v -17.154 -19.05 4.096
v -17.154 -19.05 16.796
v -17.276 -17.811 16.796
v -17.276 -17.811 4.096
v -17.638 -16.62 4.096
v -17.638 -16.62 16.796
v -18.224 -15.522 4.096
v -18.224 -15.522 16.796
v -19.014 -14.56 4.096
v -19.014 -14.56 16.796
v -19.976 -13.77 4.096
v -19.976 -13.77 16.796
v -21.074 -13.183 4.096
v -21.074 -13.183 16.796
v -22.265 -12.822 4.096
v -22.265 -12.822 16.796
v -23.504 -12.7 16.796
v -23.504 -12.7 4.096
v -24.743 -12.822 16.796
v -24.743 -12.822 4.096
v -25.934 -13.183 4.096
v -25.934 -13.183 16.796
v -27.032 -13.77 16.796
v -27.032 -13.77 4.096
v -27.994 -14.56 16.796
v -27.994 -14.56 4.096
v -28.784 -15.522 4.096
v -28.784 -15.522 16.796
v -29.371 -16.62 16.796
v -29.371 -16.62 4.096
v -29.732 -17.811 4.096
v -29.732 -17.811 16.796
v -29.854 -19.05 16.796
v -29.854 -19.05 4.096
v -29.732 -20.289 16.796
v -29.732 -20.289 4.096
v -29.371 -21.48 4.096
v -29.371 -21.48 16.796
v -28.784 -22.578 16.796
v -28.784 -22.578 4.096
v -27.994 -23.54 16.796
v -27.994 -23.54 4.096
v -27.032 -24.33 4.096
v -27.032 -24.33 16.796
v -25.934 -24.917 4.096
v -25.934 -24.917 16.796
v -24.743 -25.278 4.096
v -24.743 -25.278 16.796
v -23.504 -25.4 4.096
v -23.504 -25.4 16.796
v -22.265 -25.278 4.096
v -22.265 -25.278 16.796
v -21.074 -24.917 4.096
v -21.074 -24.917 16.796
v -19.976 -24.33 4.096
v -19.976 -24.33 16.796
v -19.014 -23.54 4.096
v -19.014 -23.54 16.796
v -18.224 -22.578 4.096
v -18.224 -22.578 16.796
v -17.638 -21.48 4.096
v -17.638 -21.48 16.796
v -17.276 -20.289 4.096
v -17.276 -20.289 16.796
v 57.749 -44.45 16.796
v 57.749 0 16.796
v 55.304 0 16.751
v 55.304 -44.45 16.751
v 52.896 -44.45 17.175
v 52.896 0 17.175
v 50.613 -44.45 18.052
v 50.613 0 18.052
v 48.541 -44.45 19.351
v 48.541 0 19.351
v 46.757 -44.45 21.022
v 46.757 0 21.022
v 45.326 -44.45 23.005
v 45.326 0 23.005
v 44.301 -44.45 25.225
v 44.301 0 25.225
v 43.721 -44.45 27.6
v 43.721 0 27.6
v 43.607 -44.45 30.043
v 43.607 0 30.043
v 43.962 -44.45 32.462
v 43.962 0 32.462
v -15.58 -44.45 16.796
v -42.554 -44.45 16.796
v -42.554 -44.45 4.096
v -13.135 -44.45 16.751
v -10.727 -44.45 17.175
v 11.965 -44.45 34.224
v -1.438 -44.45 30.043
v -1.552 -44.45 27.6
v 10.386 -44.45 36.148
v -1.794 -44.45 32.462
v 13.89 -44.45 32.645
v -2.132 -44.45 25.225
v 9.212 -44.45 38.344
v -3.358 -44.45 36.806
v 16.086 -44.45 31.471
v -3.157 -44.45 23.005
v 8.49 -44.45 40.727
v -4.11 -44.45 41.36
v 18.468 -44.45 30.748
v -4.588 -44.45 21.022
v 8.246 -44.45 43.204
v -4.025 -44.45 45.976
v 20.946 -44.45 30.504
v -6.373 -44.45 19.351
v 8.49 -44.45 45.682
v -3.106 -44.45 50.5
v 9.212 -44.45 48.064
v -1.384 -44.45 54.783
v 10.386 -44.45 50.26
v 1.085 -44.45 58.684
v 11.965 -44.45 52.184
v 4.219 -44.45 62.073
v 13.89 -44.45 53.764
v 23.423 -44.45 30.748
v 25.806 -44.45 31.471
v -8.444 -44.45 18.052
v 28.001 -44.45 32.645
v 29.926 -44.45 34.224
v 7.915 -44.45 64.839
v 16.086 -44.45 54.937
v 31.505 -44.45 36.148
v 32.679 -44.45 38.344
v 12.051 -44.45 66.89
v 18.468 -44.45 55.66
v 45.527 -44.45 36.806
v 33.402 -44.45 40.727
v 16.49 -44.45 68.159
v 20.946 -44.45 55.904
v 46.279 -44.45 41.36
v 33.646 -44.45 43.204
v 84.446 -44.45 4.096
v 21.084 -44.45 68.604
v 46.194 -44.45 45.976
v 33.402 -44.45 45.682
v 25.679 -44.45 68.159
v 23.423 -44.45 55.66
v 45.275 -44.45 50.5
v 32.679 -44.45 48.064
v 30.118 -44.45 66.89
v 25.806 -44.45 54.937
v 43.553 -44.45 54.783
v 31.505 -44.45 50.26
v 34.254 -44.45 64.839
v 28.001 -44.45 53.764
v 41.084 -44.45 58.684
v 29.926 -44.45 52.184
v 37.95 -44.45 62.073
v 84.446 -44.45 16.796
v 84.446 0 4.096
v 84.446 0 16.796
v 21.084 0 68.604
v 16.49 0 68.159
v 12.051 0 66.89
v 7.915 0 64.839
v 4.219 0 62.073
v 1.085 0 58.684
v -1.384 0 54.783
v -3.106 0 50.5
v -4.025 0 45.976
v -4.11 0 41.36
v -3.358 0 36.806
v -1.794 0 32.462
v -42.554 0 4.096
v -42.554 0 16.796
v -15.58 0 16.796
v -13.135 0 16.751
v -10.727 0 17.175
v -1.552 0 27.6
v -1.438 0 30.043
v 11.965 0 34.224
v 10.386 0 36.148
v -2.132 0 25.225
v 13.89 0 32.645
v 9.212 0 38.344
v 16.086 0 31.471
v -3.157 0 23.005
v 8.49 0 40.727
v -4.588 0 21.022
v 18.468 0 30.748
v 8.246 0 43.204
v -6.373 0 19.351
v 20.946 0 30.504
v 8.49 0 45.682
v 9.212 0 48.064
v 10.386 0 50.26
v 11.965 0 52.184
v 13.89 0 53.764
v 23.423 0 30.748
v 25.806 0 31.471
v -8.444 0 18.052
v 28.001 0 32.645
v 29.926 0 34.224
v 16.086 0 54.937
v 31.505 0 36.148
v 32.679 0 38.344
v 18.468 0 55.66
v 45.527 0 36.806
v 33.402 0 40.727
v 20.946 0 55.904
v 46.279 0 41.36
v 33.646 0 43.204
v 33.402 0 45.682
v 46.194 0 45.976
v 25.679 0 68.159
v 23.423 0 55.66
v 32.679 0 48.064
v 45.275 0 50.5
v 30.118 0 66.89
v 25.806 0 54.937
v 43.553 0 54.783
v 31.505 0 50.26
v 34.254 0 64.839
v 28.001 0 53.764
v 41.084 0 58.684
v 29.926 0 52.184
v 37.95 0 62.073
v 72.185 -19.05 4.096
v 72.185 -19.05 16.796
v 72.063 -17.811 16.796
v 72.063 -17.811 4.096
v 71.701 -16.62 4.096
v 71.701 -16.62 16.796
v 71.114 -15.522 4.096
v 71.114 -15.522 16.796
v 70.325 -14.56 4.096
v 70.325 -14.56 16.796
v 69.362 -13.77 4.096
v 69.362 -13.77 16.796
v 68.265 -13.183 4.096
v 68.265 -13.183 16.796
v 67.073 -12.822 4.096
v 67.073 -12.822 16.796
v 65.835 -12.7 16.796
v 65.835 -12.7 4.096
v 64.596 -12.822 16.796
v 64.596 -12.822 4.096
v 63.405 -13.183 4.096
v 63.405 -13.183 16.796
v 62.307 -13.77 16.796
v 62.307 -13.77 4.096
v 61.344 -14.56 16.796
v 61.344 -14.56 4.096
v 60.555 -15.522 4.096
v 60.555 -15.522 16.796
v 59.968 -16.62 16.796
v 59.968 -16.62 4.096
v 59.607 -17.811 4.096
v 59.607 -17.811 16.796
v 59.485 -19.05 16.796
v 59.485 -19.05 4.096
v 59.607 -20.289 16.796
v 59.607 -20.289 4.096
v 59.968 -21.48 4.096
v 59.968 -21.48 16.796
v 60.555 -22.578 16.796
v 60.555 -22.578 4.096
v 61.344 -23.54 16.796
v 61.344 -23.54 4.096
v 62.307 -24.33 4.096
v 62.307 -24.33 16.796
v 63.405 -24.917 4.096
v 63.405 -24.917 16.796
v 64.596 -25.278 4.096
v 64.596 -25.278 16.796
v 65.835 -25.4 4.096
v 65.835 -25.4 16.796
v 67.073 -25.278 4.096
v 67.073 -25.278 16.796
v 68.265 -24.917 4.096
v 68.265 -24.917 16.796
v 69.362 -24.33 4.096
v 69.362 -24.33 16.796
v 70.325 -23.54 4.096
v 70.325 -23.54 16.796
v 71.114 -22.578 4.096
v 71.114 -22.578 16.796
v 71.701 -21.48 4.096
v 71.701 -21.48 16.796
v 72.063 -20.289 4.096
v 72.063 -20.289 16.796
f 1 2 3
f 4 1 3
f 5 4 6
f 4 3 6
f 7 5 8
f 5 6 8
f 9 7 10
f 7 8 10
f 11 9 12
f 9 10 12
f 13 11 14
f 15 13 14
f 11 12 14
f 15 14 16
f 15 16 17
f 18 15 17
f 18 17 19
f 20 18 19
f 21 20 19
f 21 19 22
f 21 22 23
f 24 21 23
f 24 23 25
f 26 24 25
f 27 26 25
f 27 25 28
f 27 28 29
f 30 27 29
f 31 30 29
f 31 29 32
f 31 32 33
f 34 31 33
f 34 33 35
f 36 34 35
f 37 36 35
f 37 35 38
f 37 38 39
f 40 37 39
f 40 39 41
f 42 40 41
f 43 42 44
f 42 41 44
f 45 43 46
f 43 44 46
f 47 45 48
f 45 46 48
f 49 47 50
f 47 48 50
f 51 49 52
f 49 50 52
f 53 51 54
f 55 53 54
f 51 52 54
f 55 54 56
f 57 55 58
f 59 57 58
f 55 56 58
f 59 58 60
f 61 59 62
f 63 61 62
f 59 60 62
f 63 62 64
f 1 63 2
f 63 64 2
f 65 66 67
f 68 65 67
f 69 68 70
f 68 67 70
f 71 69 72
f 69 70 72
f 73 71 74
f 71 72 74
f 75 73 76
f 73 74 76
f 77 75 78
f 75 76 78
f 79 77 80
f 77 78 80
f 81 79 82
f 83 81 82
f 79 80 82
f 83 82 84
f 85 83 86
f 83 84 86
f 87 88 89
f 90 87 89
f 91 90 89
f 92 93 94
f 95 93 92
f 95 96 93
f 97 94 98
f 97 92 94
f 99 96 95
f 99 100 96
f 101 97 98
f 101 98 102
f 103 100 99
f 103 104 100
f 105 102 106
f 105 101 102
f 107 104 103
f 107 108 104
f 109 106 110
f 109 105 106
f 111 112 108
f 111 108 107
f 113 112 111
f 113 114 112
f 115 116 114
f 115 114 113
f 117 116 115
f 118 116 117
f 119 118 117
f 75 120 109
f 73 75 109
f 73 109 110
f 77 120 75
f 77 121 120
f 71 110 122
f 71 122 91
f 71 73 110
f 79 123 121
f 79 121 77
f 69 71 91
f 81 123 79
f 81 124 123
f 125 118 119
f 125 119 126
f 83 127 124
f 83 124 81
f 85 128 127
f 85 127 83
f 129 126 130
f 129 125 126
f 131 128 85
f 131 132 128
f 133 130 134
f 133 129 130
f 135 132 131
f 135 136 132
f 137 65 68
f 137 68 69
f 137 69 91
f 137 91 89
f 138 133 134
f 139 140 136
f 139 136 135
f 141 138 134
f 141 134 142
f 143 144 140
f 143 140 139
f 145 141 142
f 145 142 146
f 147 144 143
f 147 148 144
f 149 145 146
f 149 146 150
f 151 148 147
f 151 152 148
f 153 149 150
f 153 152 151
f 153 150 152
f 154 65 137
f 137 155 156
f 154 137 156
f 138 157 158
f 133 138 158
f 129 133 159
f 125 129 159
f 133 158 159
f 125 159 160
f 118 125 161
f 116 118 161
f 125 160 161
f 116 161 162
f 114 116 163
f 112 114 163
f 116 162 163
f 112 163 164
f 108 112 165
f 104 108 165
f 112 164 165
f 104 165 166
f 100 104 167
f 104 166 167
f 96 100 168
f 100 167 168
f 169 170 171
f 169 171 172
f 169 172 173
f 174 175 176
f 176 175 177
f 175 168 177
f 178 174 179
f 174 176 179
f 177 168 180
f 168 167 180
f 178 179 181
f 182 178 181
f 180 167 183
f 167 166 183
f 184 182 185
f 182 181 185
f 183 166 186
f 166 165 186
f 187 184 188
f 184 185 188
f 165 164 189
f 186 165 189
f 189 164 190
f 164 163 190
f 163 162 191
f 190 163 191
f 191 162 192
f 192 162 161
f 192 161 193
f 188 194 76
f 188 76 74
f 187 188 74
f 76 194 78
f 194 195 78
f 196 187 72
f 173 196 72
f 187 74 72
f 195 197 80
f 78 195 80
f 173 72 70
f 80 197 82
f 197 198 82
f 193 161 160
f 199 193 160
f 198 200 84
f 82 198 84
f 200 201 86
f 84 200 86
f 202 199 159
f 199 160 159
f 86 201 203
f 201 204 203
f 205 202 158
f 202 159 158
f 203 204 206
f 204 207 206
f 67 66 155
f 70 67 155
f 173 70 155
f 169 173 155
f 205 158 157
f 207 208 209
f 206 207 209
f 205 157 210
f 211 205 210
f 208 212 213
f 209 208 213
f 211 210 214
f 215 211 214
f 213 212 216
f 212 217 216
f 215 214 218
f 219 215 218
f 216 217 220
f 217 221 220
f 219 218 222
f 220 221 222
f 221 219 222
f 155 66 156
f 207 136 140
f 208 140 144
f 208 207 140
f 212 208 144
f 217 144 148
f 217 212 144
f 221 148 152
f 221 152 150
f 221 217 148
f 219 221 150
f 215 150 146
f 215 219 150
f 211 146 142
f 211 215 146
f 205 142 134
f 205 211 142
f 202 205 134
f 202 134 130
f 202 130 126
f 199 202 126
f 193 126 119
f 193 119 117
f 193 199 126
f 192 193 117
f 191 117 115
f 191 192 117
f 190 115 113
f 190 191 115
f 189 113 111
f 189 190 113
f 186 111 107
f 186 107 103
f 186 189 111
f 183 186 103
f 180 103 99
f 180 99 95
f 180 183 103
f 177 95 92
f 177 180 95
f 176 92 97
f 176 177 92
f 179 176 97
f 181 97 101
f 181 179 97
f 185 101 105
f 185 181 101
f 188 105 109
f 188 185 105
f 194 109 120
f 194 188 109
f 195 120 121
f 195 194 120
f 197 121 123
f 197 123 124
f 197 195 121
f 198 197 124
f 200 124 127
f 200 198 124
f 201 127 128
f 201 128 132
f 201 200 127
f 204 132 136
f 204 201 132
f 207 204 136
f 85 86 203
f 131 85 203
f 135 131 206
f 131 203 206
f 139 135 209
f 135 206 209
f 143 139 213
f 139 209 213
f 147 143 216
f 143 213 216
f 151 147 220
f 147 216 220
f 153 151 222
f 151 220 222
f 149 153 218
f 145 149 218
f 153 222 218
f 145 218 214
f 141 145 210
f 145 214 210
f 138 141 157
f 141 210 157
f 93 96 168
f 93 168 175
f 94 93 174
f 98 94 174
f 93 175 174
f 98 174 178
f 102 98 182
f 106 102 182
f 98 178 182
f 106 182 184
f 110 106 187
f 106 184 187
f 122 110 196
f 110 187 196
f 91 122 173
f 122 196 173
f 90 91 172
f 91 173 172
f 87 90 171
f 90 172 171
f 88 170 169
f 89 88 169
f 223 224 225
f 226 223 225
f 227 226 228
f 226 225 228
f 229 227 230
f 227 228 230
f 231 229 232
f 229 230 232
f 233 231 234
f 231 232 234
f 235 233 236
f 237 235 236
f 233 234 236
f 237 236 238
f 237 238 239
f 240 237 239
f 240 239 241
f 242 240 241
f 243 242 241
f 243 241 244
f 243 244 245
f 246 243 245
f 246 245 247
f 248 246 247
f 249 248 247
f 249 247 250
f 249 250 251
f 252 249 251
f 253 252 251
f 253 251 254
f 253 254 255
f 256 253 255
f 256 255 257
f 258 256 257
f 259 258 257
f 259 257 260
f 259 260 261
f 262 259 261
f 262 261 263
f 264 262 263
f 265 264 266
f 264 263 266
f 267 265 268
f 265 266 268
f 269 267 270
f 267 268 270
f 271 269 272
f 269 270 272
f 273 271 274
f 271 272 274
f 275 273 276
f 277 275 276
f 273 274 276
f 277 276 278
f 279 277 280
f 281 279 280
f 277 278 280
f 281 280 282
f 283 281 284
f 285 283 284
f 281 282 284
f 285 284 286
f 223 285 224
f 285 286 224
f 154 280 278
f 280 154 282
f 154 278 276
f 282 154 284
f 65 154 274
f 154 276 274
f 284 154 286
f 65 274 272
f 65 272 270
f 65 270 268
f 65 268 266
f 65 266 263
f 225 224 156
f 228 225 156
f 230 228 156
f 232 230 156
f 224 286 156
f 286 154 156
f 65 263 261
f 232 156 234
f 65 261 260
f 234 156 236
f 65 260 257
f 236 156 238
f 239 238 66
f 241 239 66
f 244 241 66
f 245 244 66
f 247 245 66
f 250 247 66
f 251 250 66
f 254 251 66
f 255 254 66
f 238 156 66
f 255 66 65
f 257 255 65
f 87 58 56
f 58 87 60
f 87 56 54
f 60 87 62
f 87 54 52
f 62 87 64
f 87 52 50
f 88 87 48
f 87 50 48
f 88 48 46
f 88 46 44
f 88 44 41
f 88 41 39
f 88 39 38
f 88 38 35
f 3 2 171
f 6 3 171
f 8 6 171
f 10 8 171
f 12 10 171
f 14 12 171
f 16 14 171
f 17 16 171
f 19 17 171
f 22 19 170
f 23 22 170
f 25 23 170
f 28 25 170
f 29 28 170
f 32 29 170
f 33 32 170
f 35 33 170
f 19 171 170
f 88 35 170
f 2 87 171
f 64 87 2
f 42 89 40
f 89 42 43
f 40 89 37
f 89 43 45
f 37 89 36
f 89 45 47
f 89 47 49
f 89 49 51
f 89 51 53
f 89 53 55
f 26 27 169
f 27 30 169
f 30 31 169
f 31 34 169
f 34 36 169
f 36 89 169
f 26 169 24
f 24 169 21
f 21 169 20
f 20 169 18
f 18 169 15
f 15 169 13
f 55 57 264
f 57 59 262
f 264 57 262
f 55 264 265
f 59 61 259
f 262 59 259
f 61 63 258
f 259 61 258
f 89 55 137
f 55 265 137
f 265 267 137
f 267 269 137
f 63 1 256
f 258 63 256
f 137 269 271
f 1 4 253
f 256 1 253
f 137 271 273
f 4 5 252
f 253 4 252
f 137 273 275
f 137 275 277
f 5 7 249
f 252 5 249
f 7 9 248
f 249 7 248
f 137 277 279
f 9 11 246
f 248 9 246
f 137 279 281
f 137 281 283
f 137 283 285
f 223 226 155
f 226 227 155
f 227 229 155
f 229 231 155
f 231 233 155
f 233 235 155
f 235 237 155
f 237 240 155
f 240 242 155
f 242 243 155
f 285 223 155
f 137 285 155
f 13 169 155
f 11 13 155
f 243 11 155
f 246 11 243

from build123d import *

# Parameters (mm, degrees)
F0_R     = 12.7
F1_DEPTH = 44.45
F2_R     = 6.35
F3_DEPTH = 12.701


with BuildPart() as f1:
    # F0 (on Front) → F1 (new body)
    with BuildSketch(Plane.XZ):
        with BuildLine():
            ThreePointArc((57.748717, 16.796402), (46.756889, 21.022344), (43.962452, 32.462187))
            ThreePointArc((43.962452, 32.462187), (42.407297, 56.789571), (21.084465, 68.603839))
            ThreePointArc((21.084465, 68.603839), (-0.238367, 56.789571), (-1.793522, 32.462187))
            ThreePointArc((-1.793522, 32.462187), (-4.587959, 21.022344), (-15.579787, 16.796402))
            Line((-15.579787, 16.796402), (-42.276816, 16.796402))
            Line((-42.276816, 16.796402), (-42.554254, 16.796402))
            Line((-42.554254, 16.796402), (-42.554254, 4.096402))
            Line((-42.554254, 4.096402), (84.445746, 4.096402))
            Line((84.445746, 4.096402), (84.445746, 16.796402))
            Line((84.445746, 16.796402), (57.748717, 16.796402))
        make_face()
        with Locations((20.945746, 43.204218)):
            Circle(F0_R, mode=Mode.SUBTRACT)
    extrude(amount=F1_DEPTH)

    # F2 (on face) → F3 (cut, through all)
    with BuildSketch(Plane.XY.offset(16.796402)):
        with Locations((65.834609, -19.05)):
            Circle(F2_R)
        with Locations((-23.504254, -19.05)):
            Circle(F2_R)
    extrude(amount=-F3_DEPTH, mode=Mode.SUBTRACT)


solid = f1.part
